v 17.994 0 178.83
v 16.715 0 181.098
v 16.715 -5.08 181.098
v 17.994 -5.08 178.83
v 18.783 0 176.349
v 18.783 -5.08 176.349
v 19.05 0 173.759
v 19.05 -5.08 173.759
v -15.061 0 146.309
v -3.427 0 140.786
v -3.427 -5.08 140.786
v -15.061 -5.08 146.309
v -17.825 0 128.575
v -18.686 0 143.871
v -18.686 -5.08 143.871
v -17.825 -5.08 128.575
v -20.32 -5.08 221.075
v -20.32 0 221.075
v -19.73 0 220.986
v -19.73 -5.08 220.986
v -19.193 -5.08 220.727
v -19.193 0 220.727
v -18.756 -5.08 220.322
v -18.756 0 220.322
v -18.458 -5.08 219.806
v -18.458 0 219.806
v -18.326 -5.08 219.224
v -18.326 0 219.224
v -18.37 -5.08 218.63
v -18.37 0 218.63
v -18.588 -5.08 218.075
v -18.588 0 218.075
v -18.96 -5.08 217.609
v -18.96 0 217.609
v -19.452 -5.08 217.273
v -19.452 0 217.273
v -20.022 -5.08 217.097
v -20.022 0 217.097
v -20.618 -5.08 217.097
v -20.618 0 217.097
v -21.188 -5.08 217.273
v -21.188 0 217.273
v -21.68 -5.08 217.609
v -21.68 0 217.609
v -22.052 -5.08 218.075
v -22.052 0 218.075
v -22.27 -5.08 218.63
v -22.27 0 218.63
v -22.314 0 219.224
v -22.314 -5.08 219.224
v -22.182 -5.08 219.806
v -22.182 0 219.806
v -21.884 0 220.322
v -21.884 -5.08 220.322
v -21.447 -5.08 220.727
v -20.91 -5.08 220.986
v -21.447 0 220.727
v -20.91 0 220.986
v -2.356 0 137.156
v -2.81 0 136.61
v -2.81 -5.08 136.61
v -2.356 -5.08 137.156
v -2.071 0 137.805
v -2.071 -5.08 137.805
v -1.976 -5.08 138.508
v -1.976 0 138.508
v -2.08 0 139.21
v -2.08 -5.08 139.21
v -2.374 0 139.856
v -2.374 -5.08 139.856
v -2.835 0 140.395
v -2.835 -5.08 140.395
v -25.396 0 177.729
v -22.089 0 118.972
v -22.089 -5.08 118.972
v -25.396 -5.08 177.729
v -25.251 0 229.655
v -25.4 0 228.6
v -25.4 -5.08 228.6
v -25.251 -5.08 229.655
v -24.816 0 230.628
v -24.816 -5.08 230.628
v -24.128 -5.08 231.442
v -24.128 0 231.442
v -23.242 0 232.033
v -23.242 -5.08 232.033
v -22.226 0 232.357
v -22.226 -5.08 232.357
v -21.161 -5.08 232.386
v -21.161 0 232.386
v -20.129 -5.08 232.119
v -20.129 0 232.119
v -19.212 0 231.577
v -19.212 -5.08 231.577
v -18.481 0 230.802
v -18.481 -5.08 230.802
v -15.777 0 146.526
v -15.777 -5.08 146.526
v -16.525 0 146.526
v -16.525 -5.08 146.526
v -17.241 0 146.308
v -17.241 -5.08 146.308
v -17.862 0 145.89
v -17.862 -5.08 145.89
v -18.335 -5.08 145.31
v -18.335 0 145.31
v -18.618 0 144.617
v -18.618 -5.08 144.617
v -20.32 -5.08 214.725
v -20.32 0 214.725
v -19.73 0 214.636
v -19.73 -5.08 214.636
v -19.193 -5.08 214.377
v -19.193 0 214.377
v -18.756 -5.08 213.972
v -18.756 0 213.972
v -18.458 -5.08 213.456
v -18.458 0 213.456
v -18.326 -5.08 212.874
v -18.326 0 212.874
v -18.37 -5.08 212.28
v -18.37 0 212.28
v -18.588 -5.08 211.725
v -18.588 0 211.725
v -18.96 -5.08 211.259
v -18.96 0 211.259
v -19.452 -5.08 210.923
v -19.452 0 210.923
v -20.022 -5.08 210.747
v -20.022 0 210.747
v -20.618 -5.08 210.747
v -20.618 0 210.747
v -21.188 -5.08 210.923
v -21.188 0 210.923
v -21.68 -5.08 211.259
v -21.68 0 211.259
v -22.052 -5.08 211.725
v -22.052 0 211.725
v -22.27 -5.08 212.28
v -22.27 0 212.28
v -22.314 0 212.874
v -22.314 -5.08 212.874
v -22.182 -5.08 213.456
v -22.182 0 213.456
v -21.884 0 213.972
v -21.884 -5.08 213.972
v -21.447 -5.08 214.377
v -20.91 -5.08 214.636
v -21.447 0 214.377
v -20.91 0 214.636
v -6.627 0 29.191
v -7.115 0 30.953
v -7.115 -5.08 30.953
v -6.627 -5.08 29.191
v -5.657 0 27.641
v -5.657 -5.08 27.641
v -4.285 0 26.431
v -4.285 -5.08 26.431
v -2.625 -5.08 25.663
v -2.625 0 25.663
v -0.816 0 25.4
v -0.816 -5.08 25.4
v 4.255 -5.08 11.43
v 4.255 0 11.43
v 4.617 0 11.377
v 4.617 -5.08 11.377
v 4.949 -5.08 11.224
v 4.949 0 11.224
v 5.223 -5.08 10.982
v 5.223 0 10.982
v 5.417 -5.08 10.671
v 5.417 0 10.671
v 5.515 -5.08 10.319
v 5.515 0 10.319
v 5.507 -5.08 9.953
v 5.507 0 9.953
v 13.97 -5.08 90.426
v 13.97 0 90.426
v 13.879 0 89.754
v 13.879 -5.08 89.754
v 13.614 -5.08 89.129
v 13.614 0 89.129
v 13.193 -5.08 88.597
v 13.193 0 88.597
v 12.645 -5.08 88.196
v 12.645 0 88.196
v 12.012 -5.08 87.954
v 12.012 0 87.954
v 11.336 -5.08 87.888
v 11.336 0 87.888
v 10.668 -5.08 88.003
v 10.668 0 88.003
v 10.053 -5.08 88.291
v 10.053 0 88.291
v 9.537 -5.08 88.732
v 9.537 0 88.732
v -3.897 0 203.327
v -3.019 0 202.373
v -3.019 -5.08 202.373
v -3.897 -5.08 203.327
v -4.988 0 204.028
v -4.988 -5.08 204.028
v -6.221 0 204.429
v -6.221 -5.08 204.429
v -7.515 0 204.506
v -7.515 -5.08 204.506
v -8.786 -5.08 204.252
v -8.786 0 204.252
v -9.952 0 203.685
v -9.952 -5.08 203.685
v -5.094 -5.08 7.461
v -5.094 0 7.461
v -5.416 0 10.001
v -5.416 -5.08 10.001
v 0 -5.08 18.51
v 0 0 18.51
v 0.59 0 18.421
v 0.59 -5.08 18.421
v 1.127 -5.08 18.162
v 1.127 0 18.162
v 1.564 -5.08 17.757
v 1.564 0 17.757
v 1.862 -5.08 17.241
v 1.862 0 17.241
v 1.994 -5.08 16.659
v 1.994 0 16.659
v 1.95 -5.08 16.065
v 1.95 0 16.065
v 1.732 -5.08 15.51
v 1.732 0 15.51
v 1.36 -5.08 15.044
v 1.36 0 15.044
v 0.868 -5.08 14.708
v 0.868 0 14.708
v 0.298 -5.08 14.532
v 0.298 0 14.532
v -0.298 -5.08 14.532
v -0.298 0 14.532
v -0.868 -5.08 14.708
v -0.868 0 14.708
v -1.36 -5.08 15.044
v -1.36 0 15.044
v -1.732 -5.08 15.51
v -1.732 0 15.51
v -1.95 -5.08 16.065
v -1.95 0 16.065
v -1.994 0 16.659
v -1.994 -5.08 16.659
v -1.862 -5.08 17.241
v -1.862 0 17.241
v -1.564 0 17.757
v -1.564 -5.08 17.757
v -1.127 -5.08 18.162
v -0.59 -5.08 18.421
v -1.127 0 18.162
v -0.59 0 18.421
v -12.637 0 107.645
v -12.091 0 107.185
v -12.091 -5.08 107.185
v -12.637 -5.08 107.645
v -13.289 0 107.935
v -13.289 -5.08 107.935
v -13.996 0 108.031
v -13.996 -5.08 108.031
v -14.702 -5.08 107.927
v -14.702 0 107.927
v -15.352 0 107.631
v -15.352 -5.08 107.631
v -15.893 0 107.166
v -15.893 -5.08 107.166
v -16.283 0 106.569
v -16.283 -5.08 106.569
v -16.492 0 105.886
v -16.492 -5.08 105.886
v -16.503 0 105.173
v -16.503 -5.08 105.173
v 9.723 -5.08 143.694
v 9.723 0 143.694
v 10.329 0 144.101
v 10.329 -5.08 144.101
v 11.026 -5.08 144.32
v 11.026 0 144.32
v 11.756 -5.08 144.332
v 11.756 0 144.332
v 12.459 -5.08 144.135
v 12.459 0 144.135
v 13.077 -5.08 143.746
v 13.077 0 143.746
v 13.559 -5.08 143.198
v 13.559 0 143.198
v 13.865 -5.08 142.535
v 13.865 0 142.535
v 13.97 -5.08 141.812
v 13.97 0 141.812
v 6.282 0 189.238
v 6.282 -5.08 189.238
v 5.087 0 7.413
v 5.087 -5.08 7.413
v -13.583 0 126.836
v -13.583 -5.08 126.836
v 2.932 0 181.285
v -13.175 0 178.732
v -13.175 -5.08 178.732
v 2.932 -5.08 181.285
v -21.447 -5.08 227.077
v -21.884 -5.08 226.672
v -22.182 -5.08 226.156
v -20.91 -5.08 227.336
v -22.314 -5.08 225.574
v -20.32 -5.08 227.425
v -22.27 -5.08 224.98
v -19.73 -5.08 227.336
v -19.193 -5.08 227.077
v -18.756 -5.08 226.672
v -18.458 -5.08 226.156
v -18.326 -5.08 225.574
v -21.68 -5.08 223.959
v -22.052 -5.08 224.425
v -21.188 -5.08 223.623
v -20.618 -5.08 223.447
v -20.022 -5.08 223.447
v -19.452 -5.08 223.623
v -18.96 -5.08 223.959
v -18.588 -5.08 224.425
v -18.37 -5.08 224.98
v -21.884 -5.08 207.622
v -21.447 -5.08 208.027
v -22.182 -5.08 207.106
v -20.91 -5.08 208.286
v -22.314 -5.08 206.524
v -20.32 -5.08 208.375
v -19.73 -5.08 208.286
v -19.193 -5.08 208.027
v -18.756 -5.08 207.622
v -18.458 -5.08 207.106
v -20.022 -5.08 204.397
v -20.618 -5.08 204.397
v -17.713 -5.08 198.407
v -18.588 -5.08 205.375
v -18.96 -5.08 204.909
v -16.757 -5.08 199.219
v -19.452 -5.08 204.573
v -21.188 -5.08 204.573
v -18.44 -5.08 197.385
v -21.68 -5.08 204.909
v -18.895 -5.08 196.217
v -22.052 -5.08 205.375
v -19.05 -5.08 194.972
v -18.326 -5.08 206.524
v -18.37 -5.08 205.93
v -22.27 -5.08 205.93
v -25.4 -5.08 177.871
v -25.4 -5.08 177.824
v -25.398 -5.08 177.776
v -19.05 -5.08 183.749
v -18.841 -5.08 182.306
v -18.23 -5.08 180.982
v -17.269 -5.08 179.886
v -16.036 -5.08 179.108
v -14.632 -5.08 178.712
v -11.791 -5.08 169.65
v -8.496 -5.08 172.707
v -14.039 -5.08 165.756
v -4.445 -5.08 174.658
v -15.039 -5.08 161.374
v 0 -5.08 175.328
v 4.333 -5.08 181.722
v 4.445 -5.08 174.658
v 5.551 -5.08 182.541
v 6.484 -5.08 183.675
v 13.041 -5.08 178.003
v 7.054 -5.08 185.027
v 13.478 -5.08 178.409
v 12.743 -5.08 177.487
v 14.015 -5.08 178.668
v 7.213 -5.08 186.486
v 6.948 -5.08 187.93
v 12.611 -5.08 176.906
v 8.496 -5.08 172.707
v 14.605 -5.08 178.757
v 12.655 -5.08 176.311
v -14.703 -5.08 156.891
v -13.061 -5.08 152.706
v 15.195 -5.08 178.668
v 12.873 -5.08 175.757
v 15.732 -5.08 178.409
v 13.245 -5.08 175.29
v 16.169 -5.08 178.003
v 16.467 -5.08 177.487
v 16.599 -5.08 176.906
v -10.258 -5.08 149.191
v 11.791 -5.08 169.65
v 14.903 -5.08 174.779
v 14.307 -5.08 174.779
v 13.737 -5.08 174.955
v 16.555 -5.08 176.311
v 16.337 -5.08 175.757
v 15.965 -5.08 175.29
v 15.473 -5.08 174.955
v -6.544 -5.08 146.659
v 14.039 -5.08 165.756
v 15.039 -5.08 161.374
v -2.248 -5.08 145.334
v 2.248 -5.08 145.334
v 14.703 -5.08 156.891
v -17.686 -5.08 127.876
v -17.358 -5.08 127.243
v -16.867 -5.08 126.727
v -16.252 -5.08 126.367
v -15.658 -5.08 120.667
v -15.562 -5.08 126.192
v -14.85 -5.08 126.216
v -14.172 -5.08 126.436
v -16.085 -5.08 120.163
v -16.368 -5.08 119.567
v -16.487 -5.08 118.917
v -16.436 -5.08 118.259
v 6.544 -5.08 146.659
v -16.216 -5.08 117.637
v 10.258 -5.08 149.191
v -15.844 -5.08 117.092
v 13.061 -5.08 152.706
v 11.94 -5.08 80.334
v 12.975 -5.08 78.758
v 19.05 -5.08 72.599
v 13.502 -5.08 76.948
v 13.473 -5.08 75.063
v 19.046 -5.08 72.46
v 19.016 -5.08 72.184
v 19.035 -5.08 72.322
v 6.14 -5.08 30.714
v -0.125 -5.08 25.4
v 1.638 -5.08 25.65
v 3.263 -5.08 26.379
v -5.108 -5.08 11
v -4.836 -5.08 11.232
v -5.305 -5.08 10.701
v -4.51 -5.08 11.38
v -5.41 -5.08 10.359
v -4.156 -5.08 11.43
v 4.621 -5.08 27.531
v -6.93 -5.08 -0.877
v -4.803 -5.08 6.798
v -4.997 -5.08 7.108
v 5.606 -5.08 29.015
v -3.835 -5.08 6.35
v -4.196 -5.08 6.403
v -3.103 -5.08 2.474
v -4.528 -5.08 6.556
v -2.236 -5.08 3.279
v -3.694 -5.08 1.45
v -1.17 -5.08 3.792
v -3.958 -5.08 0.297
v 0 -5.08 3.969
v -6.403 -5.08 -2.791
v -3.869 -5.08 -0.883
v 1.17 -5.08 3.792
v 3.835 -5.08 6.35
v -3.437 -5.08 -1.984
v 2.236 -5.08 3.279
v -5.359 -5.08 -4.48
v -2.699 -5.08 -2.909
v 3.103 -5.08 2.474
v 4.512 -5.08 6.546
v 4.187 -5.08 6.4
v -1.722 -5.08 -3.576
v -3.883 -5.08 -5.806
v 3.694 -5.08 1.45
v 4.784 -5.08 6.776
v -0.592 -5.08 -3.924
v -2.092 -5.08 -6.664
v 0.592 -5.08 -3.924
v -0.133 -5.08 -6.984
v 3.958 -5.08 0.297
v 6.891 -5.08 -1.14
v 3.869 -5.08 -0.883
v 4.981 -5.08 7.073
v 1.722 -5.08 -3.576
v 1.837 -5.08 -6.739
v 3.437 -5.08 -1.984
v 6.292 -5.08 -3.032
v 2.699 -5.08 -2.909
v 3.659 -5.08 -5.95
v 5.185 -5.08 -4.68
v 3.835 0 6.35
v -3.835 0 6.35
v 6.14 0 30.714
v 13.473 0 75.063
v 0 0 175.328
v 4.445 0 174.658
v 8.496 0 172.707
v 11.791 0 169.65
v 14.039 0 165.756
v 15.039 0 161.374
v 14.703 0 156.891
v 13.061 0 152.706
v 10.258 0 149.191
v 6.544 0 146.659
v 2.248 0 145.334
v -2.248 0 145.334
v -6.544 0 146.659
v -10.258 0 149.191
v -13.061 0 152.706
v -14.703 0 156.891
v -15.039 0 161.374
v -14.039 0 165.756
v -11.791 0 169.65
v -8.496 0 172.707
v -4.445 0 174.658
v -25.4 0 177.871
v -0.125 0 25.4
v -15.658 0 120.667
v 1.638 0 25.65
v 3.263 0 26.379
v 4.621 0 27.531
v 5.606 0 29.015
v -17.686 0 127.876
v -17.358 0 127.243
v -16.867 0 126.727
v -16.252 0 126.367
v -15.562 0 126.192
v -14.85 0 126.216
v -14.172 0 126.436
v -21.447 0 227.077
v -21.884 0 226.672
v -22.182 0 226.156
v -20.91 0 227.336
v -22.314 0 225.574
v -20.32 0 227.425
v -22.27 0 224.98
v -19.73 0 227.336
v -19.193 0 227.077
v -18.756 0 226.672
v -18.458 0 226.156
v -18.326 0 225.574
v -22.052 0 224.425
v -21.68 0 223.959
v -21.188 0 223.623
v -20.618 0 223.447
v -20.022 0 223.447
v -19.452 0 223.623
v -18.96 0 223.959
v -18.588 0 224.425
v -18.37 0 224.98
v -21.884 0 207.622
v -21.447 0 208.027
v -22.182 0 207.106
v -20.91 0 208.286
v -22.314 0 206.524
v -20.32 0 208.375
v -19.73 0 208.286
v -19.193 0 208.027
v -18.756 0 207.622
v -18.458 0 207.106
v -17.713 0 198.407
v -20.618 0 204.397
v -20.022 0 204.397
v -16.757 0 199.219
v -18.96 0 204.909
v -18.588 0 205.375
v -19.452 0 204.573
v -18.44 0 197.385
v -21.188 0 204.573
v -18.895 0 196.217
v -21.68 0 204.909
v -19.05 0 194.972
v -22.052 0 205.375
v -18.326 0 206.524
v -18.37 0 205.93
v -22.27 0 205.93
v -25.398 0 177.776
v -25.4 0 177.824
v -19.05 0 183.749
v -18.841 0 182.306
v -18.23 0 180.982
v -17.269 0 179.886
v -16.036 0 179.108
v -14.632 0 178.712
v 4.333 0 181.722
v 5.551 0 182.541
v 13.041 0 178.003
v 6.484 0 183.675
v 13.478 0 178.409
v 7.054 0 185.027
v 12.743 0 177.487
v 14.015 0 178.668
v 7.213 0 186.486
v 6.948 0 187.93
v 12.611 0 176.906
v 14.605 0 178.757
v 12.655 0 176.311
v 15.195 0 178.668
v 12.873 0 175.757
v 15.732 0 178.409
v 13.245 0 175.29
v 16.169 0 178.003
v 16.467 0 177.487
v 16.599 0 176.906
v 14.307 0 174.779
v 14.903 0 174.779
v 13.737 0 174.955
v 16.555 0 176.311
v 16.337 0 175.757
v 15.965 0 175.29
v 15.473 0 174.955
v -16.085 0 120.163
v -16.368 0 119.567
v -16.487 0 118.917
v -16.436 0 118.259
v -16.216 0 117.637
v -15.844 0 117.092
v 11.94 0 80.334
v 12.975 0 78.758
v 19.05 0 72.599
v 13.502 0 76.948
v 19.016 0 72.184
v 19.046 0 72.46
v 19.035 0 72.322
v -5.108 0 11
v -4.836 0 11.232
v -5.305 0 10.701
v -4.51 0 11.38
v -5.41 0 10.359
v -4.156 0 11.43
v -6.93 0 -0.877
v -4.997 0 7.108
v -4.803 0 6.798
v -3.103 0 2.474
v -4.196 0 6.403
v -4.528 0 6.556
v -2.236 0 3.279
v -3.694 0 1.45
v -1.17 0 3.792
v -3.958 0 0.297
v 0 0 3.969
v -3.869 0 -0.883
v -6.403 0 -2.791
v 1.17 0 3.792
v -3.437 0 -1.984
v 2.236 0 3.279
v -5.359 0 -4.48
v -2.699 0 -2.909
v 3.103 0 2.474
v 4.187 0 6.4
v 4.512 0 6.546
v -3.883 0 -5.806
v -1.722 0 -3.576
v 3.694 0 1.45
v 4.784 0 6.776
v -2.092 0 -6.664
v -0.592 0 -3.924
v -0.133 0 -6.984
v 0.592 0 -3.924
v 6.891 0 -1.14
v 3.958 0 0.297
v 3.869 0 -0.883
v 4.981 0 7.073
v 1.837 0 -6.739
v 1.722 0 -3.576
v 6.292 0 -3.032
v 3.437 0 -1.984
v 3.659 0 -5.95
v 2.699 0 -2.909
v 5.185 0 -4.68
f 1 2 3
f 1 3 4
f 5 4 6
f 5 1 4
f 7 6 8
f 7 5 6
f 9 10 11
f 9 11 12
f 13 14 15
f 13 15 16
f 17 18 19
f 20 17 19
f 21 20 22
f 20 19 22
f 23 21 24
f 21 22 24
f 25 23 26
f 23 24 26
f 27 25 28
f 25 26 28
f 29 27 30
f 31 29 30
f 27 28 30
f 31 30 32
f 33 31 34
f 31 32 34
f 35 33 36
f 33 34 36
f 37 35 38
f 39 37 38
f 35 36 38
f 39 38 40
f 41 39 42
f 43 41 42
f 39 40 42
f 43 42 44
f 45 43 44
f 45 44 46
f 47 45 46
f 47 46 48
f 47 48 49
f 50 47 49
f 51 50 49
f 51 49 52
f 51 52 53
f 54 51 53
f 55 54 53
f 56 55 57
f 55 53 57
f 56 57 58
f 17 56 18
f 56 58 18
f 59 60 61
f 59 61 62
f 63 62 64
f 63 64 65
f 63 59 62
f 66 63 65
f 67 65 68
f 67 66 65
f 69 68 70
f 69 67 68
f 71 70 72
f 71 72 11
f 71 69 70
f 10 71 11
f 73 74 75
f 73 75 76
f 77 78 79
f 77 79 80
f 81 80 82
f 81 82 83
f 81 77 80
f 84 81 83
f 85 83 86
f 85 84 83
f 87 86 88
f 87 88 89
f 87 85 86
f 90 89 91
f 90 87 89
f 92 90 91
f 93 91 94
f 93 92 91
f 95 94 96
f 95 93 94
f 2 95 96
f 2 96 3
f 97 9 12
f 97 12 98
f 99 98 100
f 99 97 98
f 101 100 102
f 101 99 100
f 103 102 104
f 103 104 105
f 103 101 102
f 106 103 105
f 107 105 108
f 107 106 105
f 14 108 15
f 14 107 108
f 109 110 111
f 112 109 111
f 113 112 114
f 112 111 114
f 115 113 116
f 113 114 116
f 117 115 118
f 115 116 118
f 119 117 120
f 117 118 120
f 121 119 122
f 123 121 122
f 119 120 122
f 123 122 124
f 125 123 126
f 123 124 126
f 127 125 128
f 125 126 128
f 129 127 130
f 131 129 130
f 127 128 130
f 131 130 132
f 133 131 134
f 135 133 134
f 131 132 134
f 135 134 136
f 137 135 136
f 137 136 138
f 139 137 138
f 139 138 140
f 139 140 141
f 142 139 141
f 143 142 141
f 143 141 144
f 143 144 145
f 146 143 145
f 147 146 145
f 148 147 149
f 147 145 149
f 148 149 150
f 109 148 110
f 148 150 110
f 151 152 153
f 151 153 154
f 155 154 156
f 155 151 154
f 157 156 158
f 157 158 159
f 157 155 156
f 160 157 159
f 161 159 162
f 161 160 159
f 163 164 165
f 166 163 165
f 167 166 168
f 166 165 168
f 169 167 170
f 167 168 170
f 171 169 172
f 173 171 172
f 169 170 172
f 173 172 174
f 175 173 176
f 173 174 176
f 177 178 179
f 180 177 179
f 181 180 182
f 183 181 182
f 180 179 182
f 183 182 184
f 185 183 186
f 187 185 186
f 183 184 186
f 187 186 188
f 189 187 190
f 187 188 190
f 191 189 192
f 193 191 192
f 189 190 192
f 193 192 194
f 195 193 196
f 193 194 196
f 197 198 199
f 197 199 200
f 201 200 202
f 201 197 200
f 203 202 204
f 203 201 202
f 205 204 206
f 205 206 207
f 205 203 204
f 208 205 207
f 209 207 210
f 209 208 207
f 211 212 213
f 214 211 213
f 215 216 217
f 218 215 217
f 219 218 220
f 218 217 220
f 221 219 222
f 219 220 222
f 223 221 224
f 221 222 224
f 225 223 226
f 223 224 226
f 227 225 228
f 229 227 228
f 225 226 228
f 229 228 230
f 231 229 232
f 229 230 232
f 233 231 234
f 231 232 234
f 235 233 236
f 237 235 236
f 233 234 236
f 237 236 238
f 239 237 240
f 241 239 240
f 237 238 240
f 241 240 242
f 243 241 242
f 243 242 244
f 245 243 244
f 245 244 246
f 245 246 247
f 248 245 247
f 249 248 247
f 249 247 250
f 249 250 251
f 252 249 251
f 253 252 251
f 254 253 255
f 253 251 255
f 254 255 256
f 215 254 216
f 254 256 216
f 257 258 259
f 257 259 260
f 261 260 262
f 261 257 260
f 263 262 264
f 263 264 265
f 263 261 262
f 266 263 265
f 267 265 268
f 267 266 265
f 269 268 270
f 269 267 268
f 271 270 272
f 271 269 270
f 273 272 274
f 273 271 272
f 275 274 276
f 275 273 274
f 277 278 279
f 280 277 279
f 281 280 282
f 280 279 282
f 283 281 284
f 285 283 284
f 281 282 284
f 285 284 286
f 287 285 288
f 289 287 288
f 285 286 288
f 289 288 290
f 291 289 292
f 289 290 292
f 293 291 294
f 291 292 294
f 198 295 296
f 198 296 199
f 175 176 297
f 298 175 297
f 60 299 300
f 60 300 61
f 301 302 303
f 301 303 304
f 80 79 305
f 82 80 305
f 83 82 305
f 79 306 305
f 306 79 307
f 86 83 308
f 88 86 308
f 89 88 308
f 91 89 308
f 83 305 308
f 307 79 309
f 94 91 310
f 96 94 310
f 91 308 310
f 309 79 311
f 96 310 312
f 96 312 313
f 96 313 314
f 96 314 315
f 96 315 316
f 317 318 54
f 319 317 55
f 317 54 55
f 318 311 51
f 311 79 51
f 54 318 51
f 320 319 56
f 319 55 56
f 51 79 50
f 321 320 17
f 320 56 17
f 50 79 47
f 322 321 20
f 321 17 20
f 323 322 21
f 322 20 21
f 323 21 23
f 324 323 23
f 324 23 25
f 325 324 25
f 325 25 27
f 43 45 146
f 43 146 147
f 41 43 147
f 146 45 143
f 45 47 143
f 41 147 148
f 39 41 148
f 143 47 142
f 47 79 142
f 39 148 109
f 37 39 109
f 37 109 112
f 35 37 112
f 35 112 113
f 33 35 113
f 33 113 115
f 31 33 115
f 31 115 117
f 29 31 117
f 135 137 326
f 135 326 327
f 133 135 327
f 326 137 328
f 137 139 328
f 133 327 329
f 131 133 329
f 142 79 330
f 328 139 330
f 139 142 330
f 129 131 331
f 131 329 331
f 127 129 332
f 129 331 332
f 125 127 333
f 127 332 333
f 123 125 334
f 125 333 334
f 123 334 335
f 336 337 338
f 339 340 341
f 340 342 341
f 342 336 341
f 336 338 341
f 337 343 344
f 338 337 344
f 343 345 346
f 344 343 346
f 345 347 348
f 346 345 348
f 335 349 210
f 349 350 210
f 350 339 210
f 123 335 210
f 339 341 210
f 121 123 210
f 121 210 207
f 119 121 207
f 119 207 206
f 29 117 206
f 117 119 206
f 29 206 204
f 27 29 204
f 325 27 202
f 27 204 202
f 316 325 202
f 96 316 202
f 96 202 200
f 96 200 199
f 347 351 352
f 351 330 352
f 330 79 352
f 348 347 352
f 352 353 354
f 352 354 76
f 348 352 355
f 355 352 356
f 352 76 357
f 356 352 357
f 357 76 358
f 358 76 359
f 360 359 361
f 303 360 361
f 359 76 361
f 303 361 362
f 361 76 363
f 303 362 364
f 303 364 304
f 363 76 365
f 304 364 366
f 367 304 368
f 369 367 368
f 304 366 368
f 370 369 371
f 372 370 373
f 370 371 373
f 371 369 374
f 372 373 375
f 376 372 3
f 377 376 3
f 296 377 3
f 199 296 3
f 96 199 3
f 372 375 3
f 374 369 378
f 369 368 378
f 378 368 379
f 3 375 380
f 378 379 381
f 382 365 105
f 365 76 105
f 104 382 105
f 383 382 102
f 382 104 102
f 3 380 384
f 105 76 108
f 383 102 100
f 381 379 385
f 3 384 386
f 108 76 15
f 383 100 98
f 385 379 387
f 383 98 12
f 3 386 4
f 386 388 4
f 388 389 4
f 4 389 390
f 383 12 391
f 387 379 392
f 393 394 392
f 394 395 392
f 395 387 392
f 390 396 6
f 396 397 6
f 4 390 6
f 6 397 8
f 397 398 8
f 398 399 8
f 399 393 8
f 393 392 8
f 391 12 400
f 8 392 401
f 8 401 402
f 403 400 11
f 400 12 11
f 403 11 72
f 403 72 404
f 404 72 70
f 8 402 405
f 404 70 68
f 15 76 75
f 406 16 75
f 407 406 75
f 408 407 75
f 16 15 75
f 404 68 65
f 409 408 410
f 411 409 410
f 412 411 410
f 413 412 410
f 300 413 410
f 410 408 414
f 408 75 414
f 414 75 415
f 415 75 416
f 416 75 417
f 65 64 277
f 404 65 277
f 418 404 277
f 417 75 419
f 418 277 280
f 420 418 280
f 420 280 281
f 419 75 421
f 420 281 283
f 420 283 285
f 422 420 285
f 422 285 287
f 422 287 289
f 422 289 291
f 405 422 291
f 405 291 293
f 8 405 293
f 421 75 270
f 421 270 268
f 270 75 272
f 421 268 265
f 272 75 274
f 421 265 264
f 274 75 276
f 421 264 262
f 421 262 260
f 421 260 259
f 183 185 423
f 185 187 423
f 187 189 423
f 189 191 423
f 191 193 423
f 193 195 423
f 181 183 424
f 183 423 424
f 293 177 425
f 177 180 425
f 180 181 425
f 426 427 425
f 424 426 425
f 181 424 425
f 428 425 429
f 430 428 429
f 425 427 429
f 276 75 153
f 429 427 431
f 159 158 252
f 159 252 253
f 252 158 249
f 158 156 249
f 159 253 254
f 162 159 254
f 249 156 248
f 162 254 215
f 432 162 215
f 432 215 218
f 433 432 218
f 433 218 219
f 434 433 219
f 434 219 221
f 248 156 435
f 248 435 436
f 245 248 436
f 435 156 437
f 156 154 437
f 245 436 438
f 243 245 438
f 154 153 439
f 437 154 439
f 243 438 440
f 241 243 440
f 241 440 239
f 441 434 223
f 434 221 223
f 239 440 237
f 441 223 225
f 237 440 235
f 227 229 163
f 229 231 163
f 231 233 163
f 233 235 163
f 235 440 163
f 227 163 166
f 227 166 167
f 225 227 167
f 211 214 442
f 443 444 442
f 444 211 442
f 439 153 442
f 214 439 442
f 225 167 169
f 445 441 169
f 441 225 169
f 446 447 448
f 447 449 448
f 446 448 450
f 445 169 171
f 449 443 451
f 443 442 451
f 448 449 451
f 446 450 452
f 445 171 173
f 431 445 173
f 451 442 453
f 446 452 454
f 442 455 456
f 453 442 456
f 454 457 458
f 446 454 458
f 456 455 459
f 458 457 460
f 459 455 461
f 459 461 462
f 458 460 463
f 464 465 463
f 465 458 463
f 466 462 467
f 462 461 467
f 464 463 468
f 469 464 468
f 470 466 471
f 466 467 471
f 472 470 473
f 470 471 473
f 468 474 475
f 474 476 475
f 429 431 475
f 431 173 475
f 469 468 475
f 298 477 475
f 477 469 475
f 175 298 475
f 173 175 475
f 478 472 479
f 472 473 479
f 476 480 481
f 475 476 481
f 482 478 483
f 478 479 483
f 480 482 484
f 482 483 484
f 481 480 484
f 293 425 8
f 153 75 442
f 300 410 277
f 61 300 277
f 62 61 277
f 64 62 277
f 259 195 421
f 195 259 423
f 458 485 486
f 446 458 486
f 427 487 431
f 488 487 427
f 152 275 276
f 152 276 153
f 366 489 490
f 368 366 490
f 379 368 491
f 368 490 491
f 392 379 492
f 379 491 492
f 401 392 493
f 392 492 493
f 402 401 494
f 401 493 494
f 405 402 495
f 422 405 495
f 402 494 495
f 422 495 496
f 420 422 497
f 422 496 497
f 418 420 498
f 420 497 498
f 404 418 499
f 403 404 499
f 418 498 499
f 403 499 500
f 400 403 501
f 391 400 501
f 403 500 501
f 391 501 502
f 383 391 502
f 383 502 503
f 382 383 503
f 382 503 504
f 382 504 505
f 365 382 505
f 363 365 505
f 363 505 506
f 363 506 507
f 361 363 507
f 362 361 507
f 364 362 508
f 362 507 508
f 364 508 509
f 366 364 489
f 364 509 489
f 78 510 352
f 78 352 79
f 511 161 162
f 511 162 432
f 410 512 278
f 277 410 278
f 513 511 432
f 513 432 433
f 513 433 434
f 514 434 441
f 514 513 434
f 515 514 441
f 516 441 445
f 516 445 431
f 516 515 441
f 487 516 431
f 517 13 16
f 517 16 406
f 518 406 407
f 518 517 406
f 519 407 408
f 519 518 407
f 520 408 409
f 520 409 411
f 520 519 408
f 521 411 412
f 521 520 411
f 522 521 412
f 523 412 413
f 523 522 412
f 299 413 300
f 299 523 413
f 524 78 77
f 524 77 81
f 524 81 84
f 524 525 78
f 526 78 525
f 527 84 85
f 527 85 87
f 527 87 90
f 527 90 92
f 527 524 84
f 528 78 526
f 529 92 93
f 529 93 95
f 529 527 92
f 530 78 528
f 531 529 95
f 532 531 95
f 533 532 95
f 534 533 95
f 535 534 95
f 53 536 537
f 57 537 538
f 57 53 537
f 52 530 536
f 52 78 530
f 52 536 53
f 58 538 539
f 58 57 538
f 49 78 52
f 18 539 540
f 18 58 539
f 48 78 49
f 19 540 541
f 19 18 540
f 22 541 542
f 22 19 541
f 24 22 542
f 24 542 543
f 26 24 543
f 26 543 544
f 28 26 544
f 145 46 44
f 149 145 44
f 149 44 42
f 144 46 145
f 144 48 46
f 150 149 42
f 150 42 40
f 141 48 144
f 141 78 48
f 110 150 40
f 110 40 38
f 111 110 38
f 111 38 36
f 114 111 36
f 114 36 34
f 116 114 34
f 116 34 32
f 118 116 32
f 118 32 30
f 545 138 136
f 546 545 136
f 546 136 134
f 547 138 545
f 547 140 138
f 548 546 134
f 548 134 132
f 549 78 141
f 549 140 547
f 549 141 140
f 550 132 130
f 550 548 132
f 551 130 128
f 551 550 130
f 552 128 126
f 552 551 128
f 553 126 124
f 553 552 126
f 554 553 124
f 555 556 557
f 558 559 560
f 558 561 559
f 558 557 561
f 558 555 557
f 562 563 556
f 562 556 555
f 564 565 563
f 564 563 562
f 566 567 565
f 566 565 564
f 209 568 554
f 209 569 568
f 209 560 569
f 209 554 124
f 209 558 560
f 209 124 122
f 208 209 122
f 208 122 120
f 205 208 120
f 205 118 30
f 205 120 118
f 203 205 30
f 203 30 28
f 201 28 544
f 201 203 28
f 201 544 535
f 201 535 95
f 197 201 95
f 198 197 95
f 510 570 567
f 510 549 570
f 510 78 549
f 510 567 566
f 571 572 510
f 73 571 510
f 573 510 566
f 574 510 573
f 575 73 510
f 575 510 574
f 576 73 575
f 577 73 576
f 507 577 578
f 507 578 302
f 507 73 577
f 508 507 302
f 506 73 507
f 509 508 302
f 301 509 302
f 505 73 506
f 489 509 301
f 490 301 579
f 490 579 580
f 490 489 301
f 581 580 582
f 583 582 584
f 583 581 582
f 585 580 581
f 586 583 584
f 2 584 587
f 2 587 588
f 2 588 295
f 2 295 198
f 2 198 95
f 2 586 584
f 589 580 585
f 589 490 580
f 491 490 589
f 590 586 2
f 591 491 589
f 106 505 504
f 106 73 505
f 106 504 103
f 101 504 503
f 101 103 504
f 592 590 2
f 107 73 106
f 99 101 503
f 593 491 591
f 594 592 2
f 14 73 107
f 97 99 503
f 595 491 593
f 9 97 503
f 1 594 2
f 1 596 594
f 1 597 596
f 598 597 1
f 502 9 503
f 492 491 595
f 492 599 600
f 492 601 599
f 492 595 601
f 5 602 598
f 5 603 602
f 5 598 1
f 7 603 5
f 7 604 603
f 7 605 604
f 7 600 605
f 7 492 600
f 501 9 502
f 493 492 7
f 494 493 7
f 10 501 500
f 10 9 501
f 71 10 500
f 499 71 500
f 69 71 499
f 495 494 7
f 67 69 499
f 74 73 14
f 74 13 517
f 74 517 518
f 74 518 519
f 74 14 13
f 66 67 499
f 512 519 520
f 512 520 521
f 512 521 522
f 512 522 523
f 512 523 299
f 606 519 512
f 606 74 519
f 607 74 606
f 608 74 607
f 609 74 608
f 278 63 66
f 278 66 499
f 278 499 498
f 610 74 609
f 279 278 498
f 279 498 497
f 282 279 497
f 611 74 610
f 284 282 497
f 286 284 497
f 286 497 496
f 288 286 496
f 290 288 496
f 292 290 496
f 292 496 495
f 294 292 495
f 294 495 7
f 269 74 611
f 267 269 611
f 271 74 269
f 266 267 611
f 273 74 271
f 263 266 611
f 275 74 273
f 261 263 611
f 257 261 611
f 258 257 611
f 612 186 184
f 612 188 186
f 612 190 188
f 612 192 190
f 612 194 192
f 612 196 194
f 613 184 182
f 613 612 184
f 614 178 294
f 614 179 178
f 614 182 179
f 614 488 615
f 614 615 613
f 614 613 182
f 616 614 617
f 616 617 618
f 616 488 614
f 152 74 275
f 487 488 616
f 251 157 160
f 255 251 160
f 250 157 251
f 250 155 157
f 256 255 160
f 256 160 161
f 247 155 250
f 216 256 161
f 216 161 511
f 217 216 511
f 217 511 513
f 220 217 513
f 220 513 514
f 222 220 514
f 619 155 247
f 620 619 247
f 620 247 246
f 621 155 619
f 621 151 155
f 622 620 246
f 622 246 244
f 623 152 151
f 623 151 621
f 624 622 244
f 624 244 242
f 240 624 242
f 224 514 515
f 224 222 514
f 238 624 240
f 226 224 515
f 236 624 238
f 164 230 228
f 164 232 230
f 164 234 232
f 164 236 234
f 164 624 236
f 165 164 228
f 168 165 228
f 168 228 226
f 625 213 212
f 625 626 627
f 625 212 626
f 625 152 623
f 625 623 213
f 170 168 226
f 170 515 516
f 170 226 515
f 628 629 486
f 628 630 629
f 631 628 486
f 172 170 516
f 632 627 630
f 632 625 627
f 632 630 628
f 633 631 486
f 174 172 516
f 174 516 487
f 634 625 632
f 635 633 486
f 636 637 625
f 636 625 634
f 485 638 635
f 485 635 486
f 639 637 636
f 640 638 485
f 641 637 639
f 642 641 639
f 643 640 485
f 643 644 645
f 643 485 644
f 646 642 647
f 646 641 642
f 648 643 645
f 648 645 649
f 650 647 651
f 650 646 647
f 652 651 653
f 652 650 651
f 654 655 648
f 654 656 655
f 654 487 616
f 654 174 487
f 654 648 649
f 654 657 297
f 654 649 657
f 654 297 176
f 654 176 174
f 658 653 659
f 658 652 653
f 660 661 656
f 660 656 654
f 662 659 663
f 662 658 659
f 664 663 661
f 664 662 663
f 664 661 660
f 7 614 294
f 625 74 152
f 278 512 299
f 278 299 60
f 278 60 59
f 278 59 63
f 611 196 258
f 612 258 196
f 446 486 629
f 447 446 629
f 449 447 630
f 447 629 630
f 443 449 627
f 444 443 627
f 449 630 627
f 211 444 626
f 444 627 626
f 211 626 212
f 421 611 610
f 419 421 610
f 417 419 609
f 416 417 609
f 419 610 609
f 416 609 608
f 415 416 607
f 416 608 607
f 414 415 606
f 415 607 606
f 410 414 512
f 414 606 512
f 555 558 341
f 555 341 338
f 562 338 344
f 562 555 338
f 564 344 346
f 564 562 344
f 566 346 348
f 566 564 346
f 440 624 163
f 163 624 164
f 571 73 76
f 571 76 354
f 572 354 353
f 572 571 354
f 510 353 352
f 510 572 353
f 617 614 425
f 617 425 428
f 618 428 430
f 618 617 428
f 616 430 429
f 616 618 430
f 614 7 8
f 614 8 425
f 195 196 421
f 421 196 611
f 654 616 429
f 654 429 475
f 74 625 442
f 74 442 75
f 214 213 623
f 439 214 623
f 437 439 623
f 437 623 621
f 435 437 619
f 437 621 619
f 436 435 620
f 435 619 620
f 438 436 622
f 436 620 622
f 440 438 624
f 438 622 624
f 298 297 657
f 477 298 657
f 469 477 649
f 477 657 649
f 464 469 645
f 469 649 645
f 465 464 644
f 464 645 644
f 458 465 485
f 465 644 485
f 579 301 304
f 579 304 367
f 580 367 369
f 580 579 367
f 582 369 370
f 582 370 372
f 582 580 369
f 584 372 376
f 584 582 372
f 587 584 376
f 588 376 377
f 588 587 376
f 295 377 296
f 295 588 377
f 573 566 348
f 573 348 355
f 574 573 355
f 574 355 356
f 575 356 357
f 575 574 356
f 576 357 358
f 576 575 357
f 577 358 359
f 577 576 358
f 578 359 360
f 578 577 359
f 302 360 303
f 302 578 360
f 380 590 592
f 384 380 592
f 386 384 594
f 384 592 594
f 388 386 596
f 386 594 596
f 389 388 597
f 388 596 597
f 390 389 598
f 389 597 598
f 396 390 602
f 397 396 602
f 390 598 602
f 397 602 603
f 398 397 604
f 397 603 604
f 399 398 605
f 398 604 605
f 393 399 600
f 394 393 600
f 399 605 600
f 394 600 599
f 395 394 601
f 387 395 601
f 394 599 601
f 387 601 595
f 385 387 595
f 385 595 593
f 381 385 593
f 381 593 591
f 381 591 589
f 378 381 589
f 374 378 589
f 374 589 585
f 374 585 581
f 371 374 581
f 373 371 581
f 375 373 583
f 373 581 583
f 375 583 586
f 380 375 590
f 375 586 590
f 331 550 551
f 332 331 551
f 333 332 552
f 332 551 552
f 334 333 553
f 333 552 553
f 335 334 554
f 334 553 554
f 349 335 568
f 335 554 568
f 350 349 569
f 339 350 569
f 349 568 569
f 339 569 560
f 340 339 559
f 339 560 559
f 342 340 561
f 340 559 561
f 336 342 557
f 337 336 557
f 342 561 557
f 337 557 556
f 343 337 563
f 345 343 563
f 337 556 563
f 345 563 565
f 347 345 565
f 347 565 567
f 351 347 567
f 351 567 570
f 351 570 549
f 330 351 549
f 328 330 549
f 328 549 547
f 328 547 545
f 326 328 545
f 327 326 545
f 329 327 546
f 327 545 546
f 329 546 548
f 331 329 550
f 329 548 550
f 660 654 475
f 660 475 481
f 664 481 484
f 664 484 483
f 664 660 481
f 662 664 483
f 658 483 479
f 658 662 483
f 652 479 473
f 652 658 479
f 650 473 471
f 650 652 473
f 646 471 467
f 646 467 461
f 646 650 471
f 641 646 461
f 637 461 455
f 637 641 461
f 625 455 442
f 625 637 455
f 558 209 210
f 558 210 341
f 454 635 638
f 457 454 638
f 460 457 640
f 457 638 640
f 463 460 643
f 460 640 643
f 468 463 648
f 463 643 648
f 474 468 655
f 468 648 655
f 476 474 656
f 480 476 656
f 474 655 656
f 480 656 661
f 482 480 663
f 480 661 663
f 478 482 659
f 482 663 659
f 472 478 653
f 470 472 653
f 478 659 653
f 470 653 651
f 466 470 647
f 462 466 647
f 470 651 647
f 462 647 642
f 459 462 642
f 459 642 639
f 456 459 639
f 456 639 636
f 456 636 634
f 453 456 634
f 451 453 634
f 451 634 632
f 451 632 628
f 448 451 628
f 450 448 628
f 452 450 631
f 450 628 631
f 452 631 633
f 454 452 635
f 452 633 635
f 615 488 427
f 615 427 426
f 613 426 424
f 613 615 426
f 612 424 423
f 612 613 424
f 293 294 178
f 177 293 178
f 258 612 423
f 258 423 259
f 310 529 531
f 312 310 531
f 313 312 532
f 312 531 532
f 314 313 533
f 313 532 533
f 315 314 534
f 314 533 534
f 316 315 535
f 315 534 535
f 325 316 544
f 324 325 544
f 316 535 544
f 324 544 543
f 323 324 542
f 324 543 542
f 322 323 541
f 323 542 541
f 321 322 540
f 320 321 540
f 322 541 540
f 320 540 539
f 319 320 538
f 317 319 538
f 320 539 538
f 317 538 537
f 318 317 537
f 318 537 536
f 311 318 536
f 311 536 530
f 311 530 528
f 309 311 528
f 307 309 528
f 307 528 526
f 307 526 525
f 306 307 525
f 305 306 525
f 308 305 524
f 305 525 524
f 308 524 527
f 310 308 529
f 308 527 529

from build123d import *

# Parameters (mm, degrees)
SKETCH11_R          = 3.96875
SKETCH11_R_2        = 15.08125
SKETCH11_R_3        = 2
BOSS_EXTRUDE2_DEPTH = 5.08


with BuildPart() as part:
    # Sketch11 → Boss-Extrude2 (new body)
    with BuildSketch(Plane(origin=(0, 0, 0), x_dir=(1, 0, 0), z_dir=(0, 1, 0))):
        with BuildLine():
            Line((19.05, -173.758834345), (19.05, -72.598586407))
            ThreePointArc((19.05, -72.598586407), (19.041478453, -72.390699795), (19.015970989, -72.184208077))
            Line((19.015970989, -72.184208077), (6.891420221, 1.139540409))
            ThreePointArc((6.891420221, 1.139540409), (-0.132898533, 6.983735604), (-6.929785414, 0.876526736))
            Line((-6.929785414, 0.876526736), (-22.088986057, -118.971508934))
            Line((-22.088986057, -118.971508934), (-25.39598653, -177.728690609))
            ThreePointArc((-25.39598653, -177.728690609), (-25.398996434, -177.800028219), (-25.4, -177.871422245))
            Line((-25.4, -177.871422245), (-25.4, -228.6))
            ThreePointArc((-25.4, -228.6), (-22.745272537, -232.230626029), (-18.480606107, -230.801765114))
            Line((-18.480606107, -230.801765114), (16.71464631, -181.098051393))
            ThreePointArc((16.71464631, -181.098051393), (18.452086765, -177.609742801), (19.05, -173.758834345))
        make_face()
        with Locations(Location((0, 0, 0), (0, 0, 270))):
            Circle(SKETCH11_R, mode=Mode.SUBTRACT)
        with Locations(Location((0, -160.246508934, 0), (0, 0, 270))):
            Circle(SKETCH11_R_2, mode=Mode.SUBTRACT)
        with Locations(Location((-20.32, -225.425, 0), (0, 0, 270))):
            Circle(SKETCH11_R_3, mode=Mode.SUBTRACT)
        with Locations(Location((-20.32, -219.075, 0), (0, 0, 270))):
            Circle(SKETCH11_R_3, mode=Mode.SUBTRACT)
        with Locations(Location((-20.32, -212.725, 0), (0, 0, 270))):
            Circle(SKETCH11_R_3, mode=Mode.SUBTRACT)
        with Locations(Location((-20.32, -206.375, 0), (0, 0, 270))):
            Circle(SKETCH11_R_3, mode=Mode.SUBTRACT)
        with Locations(Location((0, -16.51, 0), (0, 0, 270))):
            Circle(SKETCH11_R_3, mode=Mode.SUBTRACT)
        with Locations(Location((14.605, -176.756508934, 0), (0, 0, 270))):
            Circle(SKETCH11_R_3, mode=Mode.SUBTRACT)
        with BuildLine():
            Line((11.940278596, -80.334093652), (-12.090624848, -107.18518059))
            ThreePointArc((-12.090624848, -107.18518059), (-15.037374992, -107.802243553), (-16.503240932, -105.172540118))
            Line((-16.503240932, -105.172540118), (-7.115464935, -30.953157513))
            ThreePointArc((-7.115464935, -30.953157513), (-5.014621207, -26.986469282), (-0.815660013, -25.4))
            Line((-0.815660013, -25.4), (-0.124902871, -25.4))
            ThreePointArc((-0.124902871, -25.4), (3.982665997, -26.907440966), (6.140024603, -30.714054174))
            Line((6.140024603, -30.714054174), (13.473470783, -75.063389134))
            ThreePointArc((13.473470783, -75.063389134), (13.305815609, -77.87296697), (11.940278596, -80.334093652))
        make_face(mode=Mode.SUBTRACT)
        with BuildLine():
            Line((13.97, -141.812492878), (13.97, -90.426050798))
            ThreePointArc((13.97, -90.426050798), (12.336685433, -88.053389523), (9.537305885, -88.732147321))
            Line((9.537305885, -88.732147321), (-15.843545445, -117.091607347))
            ThreePointArc((-15.843545445, -117.091607347), (-16.487420873, -118.917476564), (-15.657551613, -120.666673802))
            Line((-15.657551613, -120.666673802), (9.723299718, -143.693655856))
            ThreePointArc((9.723299718, -143.693655856), (12.458732541, -144.134842843), (13.97, -141.812492878))
        make_face(mode=Mode.SUBTRACT)
        with BuildLine():
            Line((-13.582521272, -126.836237527), (-2.809524218, -136.610125984))
            ThreePointArc((-2.809524218, -136.610125984), (-2.003545388, -138.86283126), (-3.426980373, -140.785879825))
            Line((-3.426980373, -140.785879825), (-15.060903725, -146.30851259))
            ThreePointArc((-15.060903725, -146.30851259), (-17.567328552, -146.121811397), (-18.686134382, -143.87119009))
            Line((-18.686134382, -143.87119009), (-17.825208084, -128.574668869))
            ThreePointArc((-17.825208084, -128.574668869), (-16.252271294, -126.367052616), (-13.582521272, -126.836237527))
        make_face(mode=Mode.SUBTRACT)
        with BuildLine():
            Line((6.282161105, -189.238159376), (-3.018903236, -202.373380963))
            ThreePointArc((-3.018903236, -202.373380963), (-6.220540057, -204.429171418), (-9.951861921, -203.684866462))
            Line((-9.951861921, -203.684866462), (-16.757100161, -199.219099788))
            ThreePointArc((-16.757100161, -199.219099788), (-18.440171631, -197.385216843), (-19.05, -194.971927471))
            Line((-19.05, -194.971927471), (-19.05, -183.748869713))
            ThreePointArc((-19.05, -183.748869713), (-17.268890157, -179.885746141), (-13.174518217, -178.731538875))
            Line((-13.174518217, -178.731538875), (2.931784364, -181.28514172))
            ThreePointArc((2.931784364, -181.28514172), (6.817844364, -184.330274157), (6.282161105, -189.238159376))
        make_face(mode=Mode.SUBTRACT)
        with BuildLine():
            Line((3.834506832, -6.35), (-3.834506832, -6.35))
            ThreePointArc((-3.834506832, -6.35), (-4.67429907, -6.667293856), (-5.094467816, -7.460631503))
            Line((-5.094467816, -7.460631503), (-5.415744418, -10.000631503))
            ThreePointArc((-5.415744418, -10.000631503), (-5.108489577, -10.999792239), (-4.155783434, -11.43))
            Line((-4.155783434, -11.43), (4.254512077, -11.43))
            ThreePointArc((4.254512077, -11.43), (5.223023884, -10.981513774), (5.507497571, -9.952810835))
            Line((5.507497571, -9.952810835), (5.087492326, -7.412810835))
            ThreePointArc((5.087492326, -7.412810835), (4.656020605, -6.651488193), (3.834506832, -6.35))
        make_face(mode=Mode.SUBTRACT)
    extrude(amount=-BOSS_EXTRUDE2_DEPTH)


solid = part.part
